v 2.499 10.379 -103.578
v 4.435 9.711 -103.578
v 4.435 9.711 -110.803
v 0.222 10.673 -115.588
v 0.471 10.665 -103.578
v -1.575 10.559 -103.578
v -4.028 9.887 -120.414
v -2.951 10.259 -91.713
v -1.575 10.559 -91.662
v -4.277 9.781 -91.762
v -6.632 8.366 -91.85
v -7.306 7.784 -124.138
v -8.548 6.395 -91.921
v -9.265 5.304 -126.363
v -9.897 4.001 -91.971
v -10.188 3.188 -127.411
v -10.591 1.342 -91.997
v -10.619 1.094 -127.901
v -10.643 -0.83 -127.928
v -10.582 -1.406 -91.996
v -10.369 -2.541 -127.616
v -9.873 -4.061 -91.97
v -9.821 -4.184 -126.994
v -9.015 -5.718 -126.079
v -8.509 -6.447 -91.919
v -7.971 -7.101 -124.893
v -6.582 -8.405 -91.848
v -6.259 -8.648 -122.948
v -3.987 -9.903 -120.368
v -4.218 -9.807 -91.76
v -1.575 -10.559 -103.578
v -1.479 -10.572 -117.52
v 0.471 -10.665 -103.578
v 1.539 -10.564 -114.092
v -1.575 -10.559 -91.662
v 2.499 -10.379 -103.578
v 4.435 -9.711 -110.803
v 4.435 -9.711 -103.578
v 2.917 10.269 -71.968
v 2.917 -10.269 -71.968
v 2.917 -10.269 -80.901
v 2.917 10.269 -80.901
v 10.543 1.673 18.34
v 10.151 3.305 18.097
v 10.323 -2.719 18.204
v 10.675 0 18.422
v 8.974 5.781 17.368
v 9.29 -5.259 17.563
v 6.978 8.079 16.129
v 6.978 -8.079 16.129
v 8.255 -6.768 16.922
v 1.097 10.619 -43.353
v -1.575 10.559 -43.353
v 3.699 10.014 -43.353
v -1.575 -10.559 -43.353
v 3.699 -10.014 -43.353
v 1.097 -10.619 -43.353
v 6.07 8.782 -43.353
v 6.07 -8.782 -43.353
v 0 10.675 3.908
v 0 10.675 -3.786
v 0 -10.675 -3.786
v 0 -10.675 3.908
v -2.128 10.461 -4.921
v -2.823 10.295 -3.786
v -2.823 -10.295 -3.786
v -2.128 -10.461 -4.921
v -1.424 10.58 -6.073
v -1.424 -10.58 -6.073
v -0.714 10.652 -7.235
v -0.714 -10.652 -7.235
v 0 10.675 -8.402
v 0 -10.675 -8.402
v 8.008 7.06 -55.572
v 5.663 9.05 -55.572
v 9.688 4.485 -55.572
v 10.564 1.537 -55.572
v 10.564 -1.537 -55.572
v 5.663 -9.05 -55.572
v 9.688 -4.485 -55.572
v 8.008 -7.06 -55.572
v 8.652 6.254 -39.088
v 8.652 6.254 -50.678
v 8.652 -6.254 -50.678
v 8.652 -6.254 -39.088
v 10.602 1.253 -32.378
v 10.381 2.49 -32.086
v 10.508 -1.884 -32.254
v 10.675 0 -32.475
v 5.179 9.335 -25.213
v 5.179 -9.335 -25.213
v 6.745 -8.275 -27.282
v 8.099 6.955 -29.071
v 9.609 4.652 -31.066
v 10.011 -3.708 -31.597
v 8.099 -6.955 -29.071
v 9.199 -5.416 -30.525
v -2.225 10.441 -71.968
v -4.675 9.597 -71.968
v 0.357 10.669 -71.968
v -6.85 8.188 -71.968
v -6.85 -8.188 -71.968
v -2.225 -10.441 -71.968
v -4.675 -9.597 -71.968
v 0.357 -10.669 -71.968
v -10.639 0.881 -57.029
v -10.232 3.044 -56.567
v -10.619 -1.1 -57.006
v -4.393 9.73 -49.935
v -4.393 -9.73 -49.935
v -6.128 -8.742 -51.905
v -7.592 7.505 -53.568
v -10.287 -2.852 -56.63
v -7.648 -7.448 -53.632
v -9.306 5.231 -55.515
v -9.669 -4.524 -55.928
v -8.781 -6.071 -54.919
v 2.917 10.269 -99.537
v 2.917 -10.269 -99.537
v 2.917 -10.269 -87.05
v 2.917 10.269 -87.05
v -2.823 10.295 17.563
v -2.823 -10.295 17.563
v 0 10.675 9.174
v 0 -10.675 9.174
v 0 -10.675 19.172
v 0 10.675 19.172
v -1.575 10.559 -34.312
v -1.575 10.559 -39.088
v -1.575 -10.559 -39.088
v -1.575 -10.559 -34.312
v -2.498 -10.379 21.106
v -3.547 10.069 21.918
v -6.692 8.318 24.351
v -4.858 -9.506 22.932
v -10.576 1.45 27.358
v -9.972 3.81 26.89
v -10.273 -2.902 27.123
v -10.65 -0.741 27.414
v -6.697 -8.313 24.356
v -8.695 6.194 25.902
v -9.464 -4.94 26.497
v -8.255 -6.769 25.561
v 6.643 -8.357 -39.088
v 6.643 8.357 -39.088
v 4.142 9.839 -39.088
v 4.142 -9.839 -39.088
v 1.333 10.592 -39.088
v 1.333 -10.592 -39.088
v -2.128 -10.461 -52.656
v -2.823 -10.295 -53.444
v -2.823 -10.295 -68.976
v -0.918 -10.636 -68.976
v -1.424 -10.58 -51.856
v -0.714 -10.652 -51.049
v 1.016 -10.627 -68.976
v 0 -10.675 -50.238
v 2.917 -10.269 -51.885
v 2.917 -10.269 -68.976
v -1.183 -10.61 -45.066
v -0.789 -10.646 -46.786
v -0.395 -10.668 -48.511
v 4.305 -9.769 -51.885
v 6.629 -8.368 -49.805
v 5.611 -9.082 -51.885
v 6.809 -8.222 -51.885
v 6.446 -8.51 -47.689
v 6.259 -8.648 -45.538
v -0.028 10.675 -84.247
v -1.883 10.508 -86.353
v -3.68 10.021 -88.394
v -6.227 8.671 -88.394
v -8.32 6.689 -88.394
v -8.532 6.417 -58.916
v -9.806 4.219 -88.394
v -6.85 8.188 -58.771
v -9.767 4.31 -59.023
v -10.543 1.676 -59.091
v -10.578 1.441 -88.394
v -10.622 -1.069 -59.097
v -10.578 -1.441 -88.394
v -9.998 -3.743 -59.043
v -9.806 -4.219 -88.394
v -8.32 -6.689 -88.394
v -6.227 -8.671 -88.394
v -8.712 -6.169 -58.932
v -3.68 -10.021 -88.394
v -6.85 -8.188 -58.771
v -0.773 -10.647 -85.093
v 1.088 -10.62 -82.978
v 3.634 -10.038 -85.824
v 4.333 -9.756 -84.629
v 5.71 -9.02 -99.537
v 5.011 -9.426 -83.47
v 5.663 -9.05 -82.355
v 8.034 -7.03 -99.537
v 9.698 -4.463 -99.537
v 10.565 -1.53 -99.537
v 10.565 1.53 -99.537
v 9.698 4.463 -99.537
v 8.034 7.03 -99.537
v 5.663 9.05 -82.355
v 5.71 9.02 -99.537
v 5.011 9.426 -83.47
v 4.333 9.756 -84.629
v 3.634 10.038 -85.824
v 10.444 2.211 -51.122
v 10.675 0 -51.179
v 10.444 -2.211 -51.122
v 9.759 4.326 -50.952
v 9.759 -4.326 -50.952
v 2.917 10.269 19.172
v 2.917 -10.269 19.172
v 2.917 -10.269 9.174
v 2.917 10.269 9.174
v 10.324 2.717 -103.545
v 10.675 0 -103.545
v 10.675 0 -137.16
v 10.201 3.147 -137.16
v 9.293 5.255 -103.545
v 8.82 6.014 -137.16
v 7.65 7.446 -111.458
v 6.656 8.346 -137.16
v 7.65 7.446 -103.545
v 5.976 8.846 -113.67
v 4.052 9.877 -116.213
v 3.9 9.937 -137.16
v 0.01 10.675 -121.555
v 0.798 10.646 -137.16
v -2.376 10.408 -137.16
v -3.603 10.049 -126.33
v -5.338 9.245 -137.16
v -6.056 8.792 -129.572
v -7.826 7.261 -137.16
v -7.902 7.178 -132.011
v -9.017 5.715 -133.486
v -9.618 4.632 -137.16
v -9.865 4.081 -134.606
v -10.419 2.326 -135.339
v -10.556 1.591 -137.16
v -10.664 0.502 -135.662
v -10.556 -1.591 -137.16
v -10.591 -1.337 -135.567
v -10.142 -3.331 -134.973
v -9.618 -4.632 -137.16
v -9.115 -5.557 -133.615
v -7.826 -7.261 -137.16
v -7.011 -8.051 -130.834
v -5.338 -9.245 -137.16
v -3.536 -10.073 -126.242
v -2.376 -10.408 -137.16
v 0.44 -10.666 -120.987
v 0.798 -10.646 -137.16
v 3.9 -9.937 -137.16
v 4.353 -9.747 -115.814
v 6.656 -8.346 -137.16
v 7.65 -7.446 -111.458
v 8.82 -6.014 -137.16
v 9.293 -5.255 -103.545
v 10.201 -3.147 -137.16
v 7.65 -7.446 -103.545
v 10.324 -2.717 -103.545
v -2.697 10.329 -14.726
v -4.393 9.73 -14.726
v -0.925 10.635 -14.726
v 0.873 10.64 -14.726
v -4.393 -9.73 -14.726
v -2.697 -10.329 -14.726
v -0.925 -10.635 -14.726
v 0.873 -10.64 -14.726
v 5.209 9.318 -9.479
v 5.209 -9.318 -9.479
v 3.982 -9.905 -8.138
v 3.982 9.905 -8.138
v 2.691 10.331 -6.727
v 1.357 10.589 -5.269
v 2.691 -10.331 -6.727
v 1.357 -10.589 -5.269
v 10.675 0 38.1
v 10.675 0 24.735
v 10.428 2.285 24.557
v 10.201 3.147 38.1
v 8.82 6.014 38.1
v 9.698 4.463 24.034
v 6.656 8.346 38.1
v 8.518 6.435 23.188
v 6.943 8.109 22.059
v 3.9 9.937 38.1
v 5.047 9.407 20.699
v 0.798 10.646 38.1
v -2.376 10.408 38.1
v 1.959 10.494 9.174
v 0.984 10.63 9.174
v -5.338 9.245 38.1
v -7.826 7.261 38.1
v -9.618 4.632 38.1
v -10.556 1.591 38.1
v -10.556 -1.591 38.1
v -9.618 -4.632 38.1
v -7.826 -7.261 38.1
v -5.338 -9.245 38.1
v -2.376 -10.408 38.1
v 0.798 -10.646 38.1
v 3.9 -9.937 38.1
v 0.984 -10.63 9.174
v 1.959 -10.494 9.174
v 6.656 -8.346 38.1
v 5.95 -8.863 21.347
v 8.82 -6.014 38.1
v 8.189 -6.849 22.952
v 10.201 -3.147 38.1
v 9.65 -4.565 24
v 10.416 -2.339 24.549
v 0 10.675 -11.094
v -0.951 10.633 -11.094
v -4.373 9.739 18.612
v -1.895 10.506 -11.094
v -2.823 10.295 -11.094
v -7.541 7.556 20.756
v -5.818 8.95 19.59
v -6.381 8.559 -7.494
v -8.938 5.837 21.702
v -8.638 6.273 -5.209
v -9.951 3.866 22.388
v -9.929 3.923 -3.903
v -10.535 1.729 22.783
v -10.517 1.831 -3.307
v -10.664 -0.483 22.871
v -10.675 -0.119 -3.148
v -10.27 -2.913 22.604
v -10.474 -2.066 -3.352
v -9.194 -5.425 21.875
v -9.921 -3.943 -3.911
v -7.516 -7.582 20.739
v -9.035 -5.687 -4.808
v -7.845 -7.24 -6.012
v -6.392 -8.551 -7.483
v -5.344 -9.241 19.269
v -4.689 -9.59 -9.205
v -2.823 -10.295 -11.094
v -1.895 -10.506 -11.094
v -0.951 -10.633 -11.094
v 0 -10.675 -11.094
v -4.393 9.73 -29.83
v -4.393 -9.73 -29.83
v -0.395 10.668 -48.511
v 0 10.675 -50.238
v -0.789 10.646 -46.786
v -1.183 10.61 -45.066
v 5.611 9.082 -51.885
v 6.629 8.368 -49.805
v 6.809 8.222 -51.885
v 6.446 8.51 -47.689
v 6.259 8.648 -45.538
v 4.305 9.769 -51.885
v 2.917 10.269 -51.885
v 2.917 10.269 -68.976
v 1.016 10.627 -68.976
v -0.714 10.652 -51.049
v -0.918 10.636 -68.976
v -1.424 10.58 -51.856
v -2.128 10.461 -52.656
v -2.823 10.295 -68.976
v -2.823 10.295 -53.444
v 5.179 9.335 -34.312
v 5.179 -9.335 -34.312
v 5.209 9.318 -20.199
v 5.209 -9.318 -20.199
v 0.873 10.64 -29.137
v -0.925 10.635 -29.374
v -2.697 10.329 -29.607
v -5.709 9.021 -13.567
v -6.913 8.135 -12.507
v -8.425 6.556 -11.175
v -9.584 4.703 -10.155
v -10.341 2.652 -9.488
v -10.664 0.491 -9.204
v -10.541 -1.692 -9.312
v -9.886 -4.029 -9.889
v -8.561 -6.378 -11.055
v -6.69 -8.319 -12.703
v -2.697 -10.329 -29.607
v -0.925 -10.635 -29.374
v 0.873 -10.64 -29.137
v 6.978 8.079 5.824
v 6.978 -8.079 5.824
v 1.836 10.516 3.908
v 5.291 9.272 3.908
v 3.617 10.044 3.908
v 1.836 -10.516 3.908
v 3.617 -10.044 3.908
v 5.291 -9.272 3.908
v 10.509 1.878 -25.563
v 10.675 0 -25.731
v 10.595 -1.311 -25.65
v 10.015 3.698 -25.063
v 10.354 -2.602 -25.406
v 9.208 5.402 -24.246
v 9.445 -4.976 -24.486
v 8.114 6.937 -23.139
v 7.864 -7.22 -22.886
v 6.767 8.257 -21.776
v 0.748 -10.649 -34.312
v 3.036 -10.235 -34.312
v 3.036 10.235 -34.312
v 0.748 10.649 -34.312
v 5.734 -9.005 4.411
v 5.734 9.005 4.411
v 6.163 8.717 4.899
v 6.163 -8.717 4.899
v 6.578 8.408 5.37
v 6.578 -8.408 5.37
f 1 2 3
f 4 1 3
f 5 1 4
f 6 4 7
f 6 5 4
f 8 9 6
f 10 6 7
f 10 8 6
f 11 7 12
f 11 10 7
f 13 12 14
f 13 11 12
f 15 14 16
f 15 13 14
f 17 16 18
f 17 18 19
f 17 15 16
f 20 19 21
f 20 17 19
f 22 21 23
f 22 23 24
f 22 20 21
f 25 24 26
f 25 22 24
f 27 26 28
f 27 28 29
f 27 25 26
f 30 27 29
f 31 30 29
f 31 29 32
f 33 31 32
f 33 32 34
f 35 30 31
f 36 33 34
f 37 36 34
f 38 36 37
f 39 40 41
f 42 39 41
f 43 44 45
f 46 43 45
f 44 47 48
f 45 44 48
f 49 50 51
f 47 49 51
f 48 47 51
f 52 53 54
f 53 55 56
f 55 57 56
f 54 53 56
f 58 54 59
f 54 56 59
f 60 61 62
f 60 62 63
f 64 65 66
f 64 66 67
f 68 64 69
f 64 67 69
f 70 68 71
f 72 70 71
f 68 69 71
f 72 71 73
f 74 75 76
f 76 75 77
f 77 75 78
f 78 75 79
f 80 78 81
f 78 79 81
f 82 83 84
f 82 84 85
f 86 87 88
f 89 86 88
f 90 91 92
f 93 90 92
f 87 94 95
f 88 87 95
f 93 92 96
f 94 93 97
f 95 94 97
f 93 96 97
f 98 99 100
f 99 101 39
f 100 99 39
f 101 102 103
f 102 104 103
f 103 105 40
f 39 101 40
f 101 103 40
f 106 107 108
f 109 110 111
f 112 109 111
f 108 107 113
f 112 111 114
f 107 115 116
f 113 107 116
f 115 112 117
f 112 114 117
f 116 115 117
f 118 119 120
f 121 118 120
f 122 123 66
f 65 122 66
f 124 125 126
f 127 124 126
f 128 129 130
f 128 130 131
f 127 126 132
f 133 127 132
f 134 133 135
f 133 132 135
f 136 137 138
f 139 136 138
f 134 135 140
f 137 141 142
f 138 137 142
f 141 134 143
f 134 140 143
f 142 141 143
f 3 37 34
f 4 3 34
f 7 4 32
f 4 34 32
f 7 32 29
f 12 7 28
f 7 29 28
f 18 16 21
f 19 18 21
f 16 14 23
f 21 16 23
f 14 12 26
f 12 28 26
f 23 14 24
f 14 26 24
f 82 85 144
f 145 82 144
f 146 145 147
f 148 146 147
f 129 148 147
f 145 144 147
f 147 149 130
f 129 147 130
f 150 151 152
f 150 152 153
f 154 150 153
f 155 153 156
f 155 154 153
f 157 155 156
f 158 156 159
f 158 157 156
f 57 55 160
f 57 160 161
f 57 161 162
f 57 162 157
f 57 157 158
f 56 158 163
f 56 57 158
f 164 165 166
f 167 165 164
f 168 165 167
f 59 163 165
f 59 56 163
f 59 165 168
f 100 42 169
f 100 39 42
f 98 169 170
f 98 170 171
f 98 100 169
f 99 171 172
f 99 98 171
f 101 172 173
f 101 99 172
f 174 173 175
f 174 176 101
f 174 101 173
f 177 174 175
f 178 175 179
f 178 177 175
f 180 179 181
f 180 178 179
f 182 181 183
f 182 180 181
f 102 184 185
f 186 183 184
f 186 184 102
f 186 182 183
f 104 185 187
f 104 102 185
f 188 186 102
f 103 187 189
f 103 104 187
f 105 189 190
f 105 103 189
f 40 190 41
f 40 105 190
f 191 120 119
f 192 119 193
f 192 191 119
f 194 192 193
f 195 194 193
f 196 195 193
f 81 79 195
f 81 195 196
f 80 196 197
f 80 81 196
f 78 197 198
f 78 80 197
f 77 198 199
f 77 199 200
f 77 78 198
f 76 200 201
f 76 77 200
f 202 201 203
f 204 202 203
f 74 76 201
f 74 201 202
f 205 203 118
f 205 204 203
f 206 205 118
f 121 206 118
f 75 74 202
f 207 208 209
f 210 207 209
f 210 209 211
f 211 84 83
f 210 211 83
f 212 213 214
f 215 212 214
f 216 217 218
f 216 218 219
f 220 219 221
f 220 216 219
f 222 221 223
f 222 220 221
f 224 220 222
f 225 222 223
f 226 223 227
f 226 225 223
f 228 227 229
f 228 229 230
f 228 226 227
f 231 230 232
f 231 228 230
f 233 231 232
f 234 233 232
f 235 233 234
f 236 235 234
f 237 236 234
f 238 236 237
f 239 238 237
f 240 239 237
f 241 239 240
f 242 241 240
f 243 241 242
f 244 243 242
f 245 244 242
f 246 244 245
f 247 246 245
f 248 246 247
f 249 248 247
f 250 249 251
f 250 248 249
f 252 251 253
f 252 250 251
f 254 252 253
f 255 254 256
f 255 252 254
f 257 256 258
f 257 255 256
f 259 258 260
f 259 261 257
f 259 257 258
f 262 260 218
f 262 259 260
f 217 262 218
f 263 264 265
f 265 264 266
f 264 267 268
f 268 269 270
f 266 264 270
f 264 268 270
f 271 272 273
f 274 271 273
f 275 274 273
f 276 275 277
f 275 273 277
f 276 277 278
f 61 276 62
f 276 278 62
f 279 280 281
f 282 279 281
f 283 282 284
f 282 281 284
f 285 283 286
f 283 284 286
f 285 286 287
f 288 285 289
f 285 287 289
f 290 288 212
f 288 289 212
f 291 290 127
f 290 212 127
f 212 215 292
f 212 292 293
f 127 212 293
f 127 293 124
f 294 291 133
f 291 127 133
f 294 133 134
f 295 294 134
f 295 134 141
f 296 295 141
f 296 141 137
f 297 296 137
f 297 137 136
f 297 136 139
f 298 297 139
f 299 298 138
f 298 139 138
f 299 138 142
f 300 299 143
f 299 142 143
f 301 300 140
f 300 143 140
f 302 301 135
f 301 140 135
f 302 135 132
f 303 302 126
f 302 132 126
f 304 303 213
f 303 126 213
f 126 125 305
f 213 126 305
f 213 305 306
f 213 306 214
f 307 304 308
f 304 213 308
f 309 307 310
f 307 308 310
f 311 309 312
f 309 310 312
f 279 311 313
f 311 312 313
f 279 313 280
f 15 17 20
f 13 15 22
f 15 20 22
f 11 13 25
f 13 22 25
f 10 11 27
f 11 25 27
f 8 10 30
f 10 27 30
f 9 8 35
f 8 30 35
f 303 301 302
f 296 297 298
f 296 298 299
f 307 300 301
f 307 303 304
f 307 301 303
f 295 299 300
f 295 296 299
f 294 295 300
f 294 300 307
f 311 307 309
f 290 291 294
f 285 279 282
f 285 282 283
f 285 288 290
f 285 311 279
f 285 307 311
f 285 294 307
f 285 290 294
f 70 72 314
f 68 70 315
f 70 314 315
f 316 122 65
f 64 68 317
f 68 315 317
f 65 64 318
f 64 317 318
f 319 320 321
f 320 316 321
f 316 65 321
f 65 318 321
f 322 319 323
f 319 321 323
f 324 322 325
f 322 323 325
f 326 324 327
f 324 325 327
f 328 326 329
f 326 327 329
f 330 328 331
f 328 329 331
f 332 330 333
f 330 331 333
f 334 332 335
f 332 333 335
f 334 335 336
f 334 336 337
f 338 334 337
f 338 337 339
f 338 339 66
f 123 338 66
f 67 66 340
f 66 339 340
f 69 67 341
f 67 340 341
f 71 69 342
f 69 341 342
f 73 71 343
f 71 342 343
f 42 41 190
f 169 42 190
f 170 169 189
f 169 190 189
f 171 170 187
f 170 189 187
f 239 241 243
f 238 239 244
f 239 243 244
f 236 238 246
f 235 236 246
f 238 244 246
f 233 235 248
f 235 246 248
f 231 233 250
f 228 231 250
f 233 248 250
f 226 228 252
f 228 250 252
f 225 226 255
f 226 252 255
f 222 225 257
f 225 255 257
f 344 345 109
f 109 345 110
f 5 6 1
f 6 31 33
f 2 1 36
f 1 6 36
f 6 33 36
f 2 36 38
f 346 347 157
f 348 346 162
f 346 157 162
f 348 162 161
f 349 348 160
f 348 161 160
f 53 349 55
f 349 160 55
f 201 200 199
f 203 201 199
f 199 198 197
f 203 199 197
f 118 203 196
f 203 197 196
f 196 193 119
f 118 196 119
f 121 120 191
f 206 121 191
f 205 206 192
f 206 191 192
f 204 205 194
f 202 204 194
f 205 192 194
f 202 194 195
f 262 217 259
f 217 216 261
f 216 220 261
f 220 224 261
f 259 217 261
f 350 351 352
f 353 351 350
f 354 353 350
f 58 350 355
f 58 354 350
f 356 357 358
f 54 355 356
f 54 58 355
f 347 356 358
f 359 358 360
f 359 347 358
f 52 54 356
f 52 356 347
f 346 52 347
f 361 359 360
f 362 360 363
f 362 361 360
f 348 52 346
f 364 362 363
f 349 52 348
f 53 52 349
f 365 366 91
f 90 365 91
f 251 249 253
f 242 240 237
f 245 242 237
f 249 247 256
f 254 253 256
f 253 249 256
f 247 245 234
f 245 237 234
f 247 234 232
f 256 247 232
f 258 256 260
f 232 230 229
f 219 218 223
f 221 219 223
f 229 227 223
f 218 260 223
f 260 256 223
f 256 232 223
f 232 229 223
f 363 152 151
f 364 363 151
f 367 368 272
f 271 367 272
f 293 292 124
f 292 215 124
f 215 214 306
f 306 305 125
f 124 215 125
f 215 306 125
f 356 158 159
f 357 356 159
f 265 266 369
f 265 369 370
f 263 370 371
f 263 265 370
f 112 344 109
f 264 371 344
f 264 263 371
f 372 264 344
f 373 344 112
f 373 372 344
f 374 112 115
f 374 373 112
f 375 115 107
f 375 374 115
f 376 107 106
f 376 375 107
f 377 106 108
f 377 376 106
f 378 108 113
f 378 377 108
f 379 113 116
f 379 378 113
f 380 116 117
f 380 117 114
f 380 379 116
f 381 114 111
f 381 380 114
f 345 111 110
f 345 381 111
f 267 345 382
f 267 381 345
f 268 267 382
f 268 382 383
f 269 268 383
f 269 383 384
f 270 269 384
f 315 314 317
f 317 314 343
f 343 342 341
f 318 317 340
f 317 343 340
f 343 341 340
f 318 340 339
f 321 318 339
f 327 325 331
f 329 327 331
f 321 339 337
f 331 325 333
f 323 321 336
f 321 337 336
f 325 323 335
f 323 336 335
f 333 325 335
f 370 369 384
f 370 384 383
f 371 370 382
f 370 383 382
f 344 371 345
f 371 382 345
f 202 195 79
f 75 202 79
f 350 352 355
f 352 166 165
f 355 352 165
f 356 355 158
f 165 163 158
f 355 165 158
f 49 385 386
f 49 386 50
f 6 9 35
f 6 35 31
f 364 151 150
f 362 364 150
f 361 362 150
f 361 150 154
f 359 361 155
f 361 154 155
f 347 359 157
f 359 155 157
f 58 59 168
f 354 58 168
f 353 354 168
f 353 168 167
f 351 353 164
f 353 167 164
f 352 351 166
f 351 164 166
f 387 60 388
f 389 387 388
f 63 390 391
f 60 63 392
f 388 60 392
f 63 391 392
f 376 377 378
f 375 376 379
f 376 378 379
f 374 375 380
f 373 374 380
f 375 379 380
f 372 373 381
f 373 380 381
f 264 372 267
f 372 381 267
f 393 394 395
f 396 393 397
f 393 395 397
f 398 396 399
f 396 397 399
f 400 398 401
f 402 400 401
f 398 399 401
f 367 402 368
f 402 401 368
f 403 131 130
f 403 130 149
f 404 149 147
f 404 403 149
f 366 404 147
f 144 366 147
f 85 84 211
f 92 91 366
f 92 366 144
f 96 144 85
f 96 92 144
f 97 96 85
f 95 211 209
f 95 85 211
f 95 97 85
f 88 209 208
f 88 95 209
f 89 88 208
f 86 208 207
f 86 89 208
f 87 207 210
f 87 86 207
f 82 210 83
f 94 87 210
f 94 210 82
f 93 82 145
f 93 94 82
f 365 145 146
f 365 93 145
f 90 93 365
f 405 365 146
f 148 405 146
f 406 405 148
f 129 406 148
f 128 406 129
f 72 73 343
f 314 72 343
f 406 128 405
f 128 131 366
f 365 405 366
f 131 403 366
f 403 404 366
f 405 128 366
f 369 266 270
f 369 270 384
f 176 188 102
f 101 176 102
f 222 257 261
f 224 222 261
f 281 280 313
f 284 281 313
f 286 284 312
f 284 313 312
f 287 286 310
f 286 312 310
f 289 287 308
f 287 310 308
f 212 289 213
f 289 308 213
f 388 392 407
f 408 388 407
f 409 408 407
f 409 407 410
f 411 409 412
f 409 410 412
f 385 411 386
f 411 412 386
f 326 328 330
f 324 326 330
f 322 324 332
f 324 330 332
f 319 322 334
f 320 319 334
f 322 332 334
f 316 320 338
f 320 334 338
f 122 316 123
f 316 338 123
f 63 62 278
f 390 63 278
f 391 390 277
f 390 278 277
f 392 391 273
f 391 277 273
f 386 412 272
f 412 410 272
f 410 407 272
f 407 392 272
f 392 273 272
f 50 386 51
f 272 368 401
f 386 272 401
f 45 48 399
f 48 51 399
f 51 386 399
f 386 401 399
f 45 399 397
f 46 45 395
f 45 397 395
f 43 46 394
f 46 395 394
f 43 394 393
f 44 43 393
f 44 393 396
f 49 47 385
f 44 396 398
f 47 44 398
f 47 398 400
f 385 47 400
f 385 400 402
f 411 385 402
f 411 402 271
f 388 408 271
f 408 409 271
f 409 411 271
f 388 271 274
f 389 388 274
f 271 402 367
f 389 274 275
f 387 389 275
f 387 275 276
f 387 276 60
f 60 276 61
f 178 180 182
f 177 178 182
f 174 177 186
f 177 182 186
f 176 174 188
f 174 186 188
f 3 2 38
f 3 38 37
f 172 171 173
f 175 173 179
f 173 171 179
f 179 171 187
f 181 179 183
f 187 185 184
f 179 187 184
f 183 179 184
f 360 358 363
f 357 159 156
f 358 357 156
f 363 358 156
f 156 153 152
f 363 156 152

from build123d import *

# Parameters (mm, degrees)
F0_R     = 10.675430612
F1_DEPTH = 137.16
F2_DEPTH = 38.1
F4_DEPTH = 17.78


with BuildPart() as f1:
    # F0 (on Top) → F1 (new body)
    with BuildSketch(Plane.XY):
        Circle(F0_R)
    extrude(amount=-F1_DEPTH)

    # F2 (add): a face of the model
    f2_faces = [f1.faces().sort_by_distance(p)[0] for p in [
        (0, 0, 0),
    ]]
    extrude(f2_faces, amount=F2_DEPTH)

    # F3 (on Front) → F4 (cut, symmetric)
    with BuildSketch(Plane.XZ):
        Polygon((15.7361086458, 21.5601604432), (11.8985436857, 25.6116390228), (2.9173363, 19.1722828895), (2.9173363, 9.1743338853), (0, 9.1743338853), (0, 19.1722828895), (-17.0550644398, 32.3716513813), (-15.3241287917, 26.0248854756), (-2.8229181189, 17.5625272095), (-2.8229181189, -3.7856895942), (0, -8.4015205503), (0, -11.0940886661), (-2.8229181189, -11.0940886661), (-13.7855187058, 0), (-17.0550644398, -8.4015205503), (-13.9778433368, -6.2859314494), (-4.392595496, -14.7255985066), (0.8731535636, -14.7255985066), (0.8731535636, -29.1371215135), (-4.392595496, -29.8299845308), (-4.392595496, -49.9350316823), (-12.6116908069, -59.2697678805), (-6.8503268994, -58.7706156075), (-6.8503268994, -71.9678923488), (2.9173363, -71.9678923488), (2.9173363, -80.9010639787), (-3.6802912408, -88.3942381419), (-13.9778433368, -88.3942381419), (-13.6558805862, -92.110427912), (-1.5746362042, -91.662183404), (-1.5746362042, -103.5782471299), (4.4348337688, -103.5782471299), (4.4348337688, -110.8033806086), (-17.0550644398, -135.2102676343), (-13.9778433368, -140.0423496962), (7.6496228576, -111.4576309919), (7.6496228576, -103.5451963544), (17.0829258859, -103.5451963544), (16.7356515435, -99.5368526672), (2.9173363, -99.5368526672), (2.9173363, -87.0497524738), (5.6630028412, -82.3548957705), (5.6630028412, -55.5720552802), (13.8188395649, -55.5720552802), (13.8188395649, -51.9570671022), (8.6516765878, -50.6781153381), (8.6516765878, -39.0876196325), (-1.5746362042, -39.0876196325), (-1.5746362042, -34.3119315803), (5.1792738959, -34.3119315803), (5.1792738959, -25.212617591), (12.1595710516, -34.4365797937), (15.5135185486, -30.6273752617), (5.2087670282, -20.1990260627), (5.2087670282, -9.4788996503), (0, -3.7856895942), (0, 3.9081033319), (5.2905785851, 3.9081033319), (6.9777617314, 5.8243007956), (6.9777617314, 16.1294173449), align=None)
        Polygon((0, -50.2383581229), (-1.5746362042, -43.3530472219), (6.0701598413, -43.3530472219), (6.8093192667, -51.8846450228), (2.9173363, -51.8846450228), (2.9173363, -68.9763724804), (-2.8229181189, -68.9763724804), (-2.8229181189, -53.4444525838), align=None, mode=Mode.SUBTRACT)
    extrude(amount=F4_DEPTH, both=True, mode=Mode.SUBTRACT)


solid = f1.part
